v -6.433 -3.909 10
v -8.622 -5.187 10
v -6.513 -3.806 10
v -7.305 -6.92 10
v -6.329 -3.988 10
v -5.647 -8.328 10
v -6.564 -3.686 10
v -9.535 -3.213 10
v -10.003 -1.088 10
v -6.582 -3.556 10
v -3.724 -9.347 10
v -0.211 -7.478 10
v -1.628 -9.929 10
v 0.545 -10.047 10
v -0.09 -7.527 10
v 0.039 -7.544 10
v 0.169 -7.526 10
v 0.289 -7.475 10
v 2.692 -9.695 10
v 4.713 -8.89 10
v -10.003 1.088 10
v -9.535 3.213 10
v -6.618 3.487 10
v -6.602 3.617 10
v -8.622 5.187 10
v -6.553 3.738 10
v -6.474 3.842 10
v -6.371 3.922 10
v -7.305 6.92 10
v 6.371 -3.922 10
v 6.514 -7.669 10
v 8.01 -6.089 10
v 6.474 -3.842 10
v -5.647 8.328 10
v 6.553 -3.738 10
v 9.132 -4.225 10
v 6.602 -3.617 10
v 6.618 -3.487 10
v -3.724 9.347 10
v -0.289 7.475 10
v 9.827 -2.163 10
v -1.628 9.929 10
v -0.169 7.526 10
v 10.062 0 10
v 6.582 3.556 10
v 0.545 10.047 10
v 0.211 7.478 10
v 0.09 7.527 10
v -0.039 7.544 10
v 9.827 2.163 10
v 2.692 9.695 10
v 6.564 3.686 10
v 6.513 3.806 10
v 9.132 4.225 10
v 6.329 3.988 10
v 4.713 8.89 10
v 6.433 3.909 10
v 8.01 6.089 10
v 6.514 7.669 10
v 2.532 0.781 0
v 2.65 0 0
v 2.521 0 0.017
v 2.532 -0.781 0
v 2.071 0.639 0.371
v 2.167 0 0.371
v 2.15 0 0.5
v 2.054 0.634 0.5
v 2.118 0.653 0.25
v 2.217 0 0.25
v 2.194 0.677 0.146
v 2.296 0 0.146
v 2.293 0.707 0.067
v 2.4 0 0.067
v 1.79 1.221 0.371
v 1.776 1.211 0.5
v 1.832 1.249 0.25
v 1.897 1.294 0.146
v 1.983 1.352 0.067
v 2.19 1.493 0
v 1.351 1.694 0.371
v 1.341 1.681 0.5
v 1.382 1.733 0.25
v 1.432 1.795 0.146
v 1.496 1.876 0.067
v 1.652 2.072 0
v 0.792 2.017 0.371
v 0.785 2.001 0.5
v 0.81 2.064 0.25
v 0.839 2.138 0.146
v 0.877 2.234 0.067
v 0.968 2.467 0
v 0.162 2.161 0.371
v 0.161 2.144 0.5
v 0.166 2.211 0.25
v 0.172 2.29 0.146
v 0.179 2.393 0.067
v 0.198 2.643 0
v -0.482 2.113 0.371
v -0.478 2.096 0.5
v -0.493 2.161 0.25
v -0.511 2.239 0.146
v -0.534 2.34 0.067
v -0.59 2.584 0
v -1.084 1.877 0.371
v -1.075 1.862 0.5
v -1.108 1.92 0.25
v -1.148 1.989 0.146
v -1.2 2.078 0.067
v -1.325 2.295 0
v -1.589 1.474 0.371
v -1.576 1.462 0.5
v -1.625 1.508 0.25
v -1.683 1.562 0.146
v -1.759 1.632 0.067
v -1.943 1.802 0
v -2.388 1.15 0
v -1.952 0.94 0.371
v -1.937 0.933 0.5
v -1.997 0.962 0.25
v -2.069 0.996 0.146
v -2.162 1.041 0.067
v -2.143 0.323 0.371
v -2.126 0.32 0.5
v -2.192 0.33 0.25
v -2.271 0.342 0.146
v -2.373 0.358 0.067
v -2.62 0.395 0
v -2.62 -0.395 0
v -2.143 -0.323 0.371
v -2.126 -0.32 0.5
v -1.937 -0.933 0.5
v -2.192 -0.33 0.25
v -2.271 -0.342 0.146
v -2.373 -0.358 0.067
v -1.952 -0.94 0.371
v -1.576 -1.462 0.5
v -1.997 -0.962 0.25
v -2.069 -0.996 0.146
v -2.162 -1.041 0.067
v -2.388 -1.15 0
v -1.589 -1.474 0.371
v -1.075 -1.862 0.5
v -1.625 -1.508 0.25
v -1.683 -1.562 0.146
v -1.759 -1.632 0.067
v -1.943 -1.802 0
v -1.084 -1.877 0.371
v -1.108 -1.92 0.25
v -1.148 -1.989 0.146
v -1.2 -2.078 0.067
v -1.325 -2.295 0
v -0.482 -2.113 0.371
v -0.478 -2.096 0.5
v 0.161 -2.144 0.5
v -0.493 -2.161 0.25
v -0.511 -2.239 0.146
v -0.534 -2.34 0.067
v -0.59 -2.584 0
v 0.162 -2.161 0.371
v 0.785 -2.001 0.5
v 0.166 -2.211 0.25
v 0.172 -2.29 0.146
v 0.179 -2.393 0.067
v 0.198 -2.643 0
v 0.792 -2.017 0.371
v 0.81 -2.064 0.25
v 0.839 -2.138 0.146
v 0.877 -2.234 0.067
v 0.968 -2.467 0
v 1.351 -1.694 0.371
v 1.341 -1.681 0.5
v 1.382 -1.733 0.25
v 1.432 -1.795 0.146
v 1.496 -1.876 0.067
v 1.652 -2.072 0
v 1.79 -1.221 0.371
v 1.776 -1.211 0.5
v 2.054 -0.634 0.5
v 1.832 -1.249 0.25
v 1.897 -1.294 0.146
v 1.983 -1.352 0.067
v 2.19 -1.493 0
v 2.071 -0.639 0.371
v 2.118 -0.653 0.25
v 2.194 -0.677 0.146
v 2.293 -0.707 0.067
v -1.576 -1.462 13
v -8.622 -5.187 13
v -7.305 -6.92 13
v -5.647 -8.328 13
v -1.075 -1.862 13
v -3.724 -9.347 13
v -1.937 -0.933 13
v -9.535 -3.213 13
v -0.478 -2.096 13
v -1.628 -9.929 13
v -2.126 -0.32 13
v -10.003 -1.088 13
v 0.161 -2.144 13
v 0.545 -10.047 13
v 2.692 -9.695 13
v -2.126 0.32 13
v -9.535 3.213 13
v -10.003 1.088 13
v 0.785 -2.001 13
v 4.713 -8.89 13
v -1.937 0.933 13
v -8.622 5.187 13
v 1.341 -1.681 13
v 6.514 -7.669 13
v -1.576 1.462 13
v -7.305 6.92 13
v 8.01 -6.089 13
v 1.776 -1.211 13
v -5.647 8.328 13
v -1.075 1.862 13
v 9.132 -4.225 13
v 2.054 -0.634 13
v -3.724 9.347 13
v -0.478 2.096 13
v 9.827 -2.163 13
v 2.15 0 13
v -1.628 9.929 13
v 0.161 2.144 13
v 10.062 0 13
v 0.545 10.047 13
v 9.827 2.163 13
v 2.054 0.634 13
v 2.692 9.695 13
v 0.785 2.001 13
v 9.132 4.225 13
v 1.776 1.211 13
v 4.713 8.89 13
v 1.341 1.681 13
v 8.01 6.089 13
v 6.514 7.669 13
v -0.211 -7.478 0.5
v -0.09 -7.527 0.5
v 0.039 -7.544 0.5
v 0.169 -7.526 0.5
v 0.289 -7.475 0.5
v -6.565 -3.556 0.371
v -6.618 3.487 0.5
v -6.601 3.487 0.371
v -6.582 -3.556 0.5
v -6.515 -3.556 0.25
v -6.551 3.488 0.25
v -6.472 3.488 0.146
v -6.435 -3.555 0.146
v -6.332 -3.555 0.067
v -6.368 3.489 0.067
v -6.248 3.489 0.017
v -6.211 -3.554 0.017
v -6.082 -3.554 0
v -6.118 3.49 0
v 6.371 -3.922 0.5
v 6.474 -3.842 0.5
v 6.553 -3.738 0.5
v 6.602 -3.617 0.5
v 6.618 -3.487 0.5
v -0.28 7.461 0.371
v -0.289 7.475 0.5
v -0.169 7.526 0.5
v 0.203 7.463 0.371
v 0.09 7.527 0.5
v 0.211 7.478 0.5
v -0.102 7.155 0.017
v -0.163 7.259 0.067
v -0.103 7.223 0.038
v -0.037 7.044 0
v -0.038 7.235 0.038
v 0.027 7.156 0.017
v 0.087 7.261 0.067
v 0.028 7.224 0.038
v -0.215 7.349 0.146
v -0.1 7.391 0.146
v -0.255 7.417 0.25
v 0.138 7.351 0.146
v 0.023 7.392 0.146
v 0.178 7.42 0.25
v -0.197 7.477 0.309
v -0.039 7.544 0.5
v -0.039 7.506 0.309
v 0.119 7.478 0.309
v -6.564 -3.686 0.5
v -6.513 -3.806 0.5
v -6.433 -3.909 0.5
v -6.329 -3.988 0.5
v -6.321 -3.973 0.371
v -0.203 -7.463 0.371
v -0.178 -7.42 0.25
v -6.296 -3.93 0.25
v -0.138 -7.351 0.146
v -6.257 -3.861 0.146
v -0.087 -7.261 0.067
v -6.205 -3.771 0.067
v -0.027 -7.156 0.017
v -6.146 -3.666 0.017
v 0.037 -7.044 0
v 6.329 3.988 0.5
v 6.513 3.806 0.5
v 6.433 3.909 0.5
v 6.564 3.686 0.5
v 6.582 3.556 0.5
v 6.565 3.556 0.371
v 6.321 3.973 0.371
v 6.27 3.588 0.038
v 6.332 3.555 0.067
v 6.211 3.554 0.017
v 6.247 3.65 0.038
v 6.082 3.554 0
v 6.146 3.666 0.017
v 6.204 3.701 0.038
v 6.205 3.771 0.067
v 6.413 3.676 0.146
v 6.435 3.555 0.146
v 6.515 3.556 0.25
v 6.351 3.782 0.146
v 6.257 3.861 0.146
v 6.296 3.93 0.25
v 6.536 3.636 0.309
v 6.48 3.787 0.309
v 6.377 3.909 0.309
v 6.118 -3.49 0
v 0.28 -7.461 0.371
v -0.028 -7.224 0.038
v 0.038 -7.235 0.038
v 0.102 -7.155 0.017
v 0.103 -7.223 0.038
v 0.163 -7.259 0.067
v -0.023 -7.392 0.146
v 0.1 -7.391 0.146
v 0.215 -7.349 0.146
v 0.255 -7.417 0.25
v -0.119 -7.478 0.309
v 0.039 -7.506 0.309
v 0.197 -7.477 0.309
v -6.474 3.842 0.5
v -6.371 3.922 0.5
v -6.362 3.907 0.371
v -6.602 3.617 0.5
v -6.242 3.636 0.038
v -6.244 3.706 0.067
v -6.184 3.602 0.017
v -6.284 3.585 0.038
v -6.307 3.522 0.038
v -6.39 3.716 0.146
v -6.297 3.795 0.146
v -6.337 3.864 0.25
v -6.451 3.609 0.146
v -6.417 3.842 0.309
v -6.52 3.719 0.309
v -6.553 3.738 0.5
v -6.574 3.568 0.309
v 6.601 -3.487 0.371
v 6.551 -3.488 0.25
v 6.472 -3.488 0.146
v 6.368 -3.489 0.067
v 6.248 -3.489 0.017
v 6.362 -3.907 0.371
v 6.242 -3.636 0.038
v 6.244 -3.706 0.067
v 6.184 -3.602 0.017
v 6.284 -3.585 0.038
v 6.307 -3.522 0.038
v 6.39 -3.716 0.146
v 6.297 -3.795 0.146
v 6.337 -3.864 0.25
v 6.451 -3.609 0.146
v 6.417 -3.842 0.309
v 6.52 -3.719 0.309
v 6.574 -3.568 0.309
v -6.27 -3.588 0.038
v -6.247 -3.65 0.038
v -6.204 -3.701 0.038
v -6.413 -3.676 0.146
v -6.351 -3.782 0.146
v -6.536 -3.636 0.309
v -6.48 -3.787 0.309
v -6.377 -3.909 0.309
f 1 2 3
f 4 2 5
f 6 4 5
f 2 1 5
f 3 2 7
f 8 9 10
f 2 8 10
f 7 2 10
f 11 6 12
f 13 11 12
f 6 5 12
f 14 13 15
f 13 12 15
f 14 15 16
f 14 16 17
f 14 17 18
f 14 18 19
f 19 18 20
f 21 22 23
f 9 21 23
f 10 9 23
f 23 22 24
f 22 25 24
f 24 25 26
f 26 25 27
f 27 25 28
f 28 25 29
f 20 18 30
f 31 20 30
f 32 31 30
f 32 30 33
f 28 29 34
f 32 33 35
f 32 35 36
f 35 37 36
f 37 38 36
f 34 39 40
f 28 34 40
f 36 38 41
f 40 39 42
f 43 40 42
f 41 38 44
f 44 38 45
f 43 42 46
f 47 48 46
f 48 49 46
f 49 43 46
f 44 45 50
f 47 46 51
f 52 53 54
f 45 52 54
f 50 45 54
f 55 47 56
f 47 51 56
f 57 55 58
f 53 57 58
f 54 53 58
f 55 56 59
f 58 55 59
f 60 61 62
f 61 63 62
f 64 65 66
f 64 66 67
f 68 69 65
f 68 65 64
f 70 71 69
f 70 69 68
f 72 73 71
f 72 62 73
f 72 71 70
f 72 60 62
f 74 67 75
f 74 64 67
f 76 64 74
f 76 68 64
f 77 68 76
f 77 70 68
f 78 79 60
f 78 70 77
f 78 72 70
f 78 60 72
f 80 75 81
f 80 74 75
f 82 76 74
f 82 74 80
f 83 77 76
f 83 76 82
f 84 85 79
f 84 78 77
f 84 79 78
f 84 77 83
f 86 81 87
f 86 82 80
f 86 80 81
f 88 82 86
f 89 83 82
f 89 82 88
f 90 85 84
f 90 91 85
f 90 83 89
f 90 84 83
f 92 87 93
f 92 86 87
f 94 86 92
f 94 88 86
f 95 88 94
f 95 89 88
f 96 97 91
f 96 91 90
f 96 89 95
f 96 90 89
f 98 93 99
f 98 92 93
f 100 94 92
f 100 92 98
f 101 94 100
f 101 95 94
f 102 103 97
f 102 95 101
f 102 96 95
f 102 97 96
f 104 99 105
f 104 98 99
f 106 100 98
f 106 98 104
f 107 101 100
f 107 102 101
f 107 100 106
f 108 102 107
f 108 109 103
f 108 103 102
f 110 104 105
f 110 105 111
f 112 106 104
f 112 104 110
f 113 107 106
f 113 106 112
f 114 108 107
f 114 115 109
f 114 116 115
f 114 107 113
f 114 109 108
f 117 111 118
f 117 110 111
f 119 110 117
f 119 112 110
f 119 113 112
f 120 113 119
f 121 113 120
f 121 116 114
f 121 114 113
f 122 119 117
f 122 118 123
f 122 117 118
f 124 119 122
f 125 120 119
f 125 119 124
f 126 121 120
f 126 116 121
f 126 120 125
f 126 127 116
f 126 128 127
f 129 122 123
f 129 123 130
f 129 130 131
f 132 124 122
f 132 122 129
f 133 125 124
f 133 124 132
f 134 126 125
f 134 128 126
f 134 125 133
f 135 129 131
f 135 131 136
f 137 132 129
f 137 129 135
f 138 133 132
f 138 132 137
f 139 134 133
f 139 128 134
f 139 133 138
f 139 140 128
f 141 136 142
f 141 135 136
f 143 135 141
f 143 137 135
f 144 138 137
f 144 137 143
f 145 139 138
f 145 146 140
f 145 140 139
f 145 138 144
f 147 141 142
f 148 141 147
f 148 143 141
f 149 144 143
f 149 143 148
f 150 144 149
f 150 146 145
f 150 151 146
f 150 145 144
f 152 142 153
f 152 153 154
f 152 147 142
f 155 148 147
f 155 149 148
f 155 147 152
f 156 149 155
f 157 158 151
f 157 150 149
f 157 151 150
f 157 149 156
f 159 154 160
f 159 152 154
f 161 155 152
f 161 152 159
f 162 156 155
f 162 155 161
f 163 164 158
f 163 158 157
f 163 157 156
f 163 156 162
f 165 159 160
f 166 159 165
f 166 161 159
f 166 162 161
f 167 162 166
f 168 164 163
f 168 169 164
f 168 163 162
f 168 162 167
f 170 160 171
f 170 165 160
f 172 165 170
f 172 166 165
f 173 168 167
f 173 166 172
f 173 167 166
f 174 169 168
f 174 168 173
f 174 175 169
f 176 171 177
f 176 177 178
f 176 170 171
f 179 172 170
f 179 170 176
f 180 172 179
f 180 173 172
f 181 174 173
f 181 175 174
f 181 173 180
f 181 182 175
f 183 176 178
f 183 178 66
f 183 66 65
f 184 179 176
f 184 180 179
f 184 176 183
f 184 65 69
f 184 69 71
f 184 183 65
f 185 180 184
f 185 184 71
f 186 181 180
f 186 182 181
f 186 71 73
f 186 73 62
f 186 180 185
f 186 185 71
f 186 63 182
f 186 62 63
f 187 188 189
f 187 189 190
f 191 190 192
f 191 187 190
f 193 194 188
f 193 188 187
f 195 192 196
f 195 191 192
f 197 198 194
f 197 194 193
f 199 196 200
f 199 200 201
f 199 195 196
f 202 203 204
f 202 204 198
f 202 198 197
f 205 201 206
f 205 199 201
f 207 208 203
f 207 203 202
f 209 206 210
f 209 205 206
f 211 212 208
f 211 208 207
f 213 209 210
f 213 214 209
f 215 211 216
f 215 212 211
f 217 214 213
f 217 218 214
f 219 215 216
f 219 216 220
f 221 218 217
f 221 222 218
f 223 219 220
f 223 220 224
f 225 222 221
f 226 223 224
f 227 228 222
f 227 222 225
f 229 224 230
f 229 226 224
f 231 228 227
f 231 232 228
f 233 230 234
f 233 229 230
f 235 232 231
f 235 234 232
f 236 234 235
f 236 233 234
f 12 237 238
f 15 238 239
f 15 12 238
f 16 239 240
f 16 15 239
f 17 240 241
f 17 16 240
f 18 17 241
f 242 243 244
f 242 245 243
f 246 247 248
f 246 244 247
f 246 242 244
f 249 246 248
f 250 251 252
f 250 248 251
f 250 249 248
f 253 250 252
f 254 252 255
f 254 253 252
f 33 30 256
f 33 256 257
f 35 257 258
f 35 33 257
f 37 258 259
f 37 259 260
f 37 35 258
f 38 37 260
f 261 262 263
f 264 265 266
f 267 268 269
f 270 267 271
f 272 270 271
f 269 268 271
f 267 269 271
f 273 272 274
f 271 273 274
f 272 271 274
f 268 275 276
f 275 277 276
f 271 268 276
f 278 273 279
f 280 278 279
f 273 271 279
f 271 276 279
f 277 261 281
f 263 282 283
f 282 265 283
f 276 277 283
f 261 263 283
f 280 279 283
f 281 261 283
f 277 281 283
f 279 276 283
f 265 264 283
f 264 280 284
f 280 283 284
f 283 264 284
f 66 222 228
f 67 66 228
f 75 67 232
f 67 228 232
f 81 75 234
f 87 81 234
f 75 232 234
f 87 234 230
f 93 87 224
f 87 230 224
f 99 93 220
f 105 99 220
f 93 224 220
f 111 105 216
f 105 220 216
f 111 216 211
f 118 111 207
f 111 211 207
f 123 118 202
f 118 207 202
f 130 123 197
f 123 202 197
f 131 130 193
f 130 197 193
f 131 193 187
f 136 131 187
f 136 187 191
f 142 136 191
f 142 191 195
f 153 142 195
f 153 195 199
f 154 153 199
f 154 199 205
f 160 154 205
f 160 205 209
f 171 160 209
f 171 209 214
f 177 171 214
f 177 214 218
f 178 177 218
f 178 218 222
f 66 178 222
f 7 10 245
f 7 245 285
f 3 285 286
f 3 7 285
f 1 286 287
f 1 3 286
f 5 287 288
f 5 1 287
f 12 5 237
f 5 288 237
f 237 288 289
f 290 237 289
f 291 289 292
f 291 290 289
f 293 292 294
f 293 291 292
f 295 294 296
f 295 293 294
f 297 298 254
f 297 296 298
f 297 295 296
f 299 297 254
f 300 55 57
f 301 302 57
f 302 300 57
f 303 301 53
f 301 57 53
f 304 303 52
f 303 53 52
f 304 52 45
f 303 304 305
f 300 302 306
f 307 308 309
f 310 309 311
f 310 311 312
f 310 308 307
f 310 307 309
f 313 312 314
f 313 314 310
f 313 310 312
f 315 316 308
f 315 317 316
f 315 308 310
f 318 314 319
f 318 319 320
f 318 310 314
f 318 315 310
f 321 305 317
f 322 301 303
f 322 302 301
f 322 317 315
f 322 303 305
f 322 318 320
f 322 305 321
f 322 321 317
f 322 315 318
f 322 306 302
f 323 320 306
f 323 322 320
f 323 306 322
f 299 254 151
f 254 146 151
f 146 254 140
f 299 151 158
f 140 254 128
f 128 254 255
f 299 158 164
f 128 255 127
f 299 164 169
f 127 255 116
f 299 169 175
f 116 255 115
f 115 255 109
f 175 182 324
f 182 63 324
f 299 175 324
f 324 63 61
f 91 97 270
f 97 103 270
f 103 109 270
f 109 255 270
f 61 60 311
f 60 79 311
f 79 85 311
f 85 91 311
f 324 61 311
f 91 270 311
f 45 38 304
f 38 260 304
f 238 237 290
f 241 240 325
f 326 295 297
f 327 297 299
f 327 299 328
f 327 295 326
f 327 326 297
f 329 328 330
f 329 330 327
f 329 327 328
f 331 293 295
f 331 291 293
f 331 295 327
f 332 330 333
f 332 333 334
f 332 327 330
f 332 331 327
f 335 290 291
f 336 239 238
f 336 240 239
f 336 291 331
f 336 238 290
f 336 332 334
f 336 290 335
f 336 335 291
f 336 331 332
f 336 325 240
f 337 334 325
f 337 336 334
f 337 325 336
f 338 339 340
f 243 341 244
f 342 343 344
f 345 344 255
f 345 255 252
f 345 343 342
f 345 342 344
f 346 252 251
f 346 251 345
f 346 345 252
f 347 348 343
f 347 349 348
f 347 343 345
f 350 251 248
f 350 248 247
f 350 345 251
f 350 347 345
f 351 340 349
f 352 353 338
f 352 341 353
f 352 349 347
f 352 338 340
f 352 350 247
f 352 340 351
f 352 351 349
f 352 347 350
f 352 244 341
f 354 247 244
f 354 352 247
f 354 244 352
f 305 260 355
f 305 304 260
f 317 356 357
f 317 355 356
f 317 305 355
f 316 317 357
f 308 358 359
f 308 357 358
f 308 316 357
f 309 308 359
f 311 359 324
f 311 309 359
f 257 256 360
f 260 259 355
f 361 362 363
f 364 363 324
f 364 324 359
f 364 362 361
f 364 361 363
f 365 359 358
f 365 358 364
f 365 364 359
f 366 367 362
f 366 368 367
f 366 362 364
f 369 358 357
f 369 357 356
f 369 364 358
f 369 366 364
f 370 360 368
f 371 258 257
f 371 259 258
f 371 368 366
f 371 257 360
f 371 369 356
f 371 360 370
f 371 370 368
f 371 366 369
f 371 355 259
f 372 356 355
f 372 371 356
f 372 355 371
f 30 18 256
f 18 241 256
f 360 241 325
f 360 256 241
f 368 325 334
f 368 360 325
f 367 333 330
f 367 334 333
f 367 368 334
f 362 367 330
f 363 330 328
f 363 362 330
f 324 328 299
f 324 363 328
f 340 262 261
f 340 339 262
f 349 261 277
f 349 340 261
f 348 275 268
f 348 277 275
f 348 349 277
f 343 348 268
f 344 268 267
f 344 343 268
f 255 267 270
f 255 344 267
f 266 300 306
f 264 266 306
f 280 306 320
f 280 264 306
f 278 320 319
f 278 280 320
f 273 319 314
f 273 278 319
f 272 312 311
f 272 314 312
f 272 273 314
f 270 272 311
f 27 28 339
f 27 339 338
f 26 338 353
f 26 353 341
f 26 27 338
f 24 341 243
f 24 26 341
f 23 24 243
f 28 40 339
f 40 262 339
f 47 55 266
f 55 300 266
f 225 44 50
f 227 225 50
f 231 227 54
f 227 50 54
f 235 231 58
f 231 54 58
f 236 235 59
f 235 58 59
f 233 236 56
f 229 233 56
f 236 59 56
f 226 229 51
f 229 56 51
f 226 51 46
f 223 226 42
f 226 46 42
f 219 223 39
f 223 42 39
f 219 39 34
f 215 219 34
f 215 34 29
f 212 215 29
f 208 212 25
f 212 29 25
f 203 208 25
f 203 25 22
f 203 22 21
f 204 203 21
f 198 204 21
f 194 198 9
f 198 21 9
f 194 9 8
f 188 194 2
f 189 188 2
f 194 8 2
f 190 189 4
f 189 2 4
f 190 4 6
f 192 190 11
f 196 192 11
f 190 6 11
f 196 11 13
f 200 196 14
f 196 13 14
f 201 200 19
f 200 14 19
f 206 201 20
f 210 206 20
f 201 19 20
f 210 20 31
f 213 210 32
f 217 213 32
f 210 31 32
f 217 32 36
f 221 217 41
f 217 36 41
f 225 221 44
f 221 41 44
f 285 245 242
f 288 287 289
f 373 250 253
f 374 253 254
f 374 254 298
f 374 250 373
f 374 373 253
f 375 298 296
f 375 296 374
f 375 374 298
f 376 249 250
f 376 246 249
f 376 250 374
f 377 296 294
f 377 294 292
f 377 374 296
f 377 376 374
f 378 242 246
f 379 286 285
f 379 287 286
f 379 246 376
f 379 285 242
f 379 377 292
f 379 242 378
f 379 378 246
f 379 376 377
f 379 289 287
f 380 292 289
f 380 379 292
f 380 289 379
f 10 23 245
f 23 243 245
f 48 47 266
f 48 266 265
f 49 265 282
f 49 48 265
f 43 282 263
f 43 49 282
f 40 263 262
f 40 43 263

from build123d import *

# Parameters (mm, degrees)
F1_DEPTH = 10
F2_R     = 10.061919
F3_DEPTH = 3
F4_R     = 2.15
F5_DEPTH = 25
F6_R     = 0.5


with BuildPart() as f1:
    # F0 (on Top) → F1 (new body)
    with BuildSketch(Plane.XY):
        Polygon((6.580053, 3.844854), (-0.039715, 7.62092), (-6.619768, 3.776066), (-6.580053, -3.844854), (0.039715, -7.62092), (6.619768, -3.776066), align=None)
    extrude(amount=F1_DEPTH)

    # F2 (on face) → F3 (join)
    with BuildSketch(Plane.XY.offset(10)):
        Circle(F2_R)
    extrude(amount=F3_DEPTH)

    # F4 (on face) → F5 (cut)
    with BuildSketch(Plane.XY.offset(13)):
        Circle(F4_R)
    extrude(amount=-F5_DEPTH, mode=Mode.SUBTRACT)

    # F6
    f6_edges = [f1.edges().sort_by_distance(p)[0] for p in [
        (-0.039715, 7.62092, 5),
        (6.580053, 3.844854, 5),
        (6.619768, -3.776066, 5),
        (0.039715, -7.62092, 5),
        (-6.580053, -3.844854, 5),
        (-6.619768, 3.776066, 5),
        (-3.329741, 5.698493, 0),
        (-6.59991, -0.034394, 0),
        (-3.270169, -5.732887, 0),
        (3.329741, -5.698493, 0),
        (6.59991, 0.034394, 0),
        (3.270169, 5.732887, 0),
        (-2.15, 0, 0),
    ]]
    fillet(f6_edges, radius=F6_R)


solid = f1.part
